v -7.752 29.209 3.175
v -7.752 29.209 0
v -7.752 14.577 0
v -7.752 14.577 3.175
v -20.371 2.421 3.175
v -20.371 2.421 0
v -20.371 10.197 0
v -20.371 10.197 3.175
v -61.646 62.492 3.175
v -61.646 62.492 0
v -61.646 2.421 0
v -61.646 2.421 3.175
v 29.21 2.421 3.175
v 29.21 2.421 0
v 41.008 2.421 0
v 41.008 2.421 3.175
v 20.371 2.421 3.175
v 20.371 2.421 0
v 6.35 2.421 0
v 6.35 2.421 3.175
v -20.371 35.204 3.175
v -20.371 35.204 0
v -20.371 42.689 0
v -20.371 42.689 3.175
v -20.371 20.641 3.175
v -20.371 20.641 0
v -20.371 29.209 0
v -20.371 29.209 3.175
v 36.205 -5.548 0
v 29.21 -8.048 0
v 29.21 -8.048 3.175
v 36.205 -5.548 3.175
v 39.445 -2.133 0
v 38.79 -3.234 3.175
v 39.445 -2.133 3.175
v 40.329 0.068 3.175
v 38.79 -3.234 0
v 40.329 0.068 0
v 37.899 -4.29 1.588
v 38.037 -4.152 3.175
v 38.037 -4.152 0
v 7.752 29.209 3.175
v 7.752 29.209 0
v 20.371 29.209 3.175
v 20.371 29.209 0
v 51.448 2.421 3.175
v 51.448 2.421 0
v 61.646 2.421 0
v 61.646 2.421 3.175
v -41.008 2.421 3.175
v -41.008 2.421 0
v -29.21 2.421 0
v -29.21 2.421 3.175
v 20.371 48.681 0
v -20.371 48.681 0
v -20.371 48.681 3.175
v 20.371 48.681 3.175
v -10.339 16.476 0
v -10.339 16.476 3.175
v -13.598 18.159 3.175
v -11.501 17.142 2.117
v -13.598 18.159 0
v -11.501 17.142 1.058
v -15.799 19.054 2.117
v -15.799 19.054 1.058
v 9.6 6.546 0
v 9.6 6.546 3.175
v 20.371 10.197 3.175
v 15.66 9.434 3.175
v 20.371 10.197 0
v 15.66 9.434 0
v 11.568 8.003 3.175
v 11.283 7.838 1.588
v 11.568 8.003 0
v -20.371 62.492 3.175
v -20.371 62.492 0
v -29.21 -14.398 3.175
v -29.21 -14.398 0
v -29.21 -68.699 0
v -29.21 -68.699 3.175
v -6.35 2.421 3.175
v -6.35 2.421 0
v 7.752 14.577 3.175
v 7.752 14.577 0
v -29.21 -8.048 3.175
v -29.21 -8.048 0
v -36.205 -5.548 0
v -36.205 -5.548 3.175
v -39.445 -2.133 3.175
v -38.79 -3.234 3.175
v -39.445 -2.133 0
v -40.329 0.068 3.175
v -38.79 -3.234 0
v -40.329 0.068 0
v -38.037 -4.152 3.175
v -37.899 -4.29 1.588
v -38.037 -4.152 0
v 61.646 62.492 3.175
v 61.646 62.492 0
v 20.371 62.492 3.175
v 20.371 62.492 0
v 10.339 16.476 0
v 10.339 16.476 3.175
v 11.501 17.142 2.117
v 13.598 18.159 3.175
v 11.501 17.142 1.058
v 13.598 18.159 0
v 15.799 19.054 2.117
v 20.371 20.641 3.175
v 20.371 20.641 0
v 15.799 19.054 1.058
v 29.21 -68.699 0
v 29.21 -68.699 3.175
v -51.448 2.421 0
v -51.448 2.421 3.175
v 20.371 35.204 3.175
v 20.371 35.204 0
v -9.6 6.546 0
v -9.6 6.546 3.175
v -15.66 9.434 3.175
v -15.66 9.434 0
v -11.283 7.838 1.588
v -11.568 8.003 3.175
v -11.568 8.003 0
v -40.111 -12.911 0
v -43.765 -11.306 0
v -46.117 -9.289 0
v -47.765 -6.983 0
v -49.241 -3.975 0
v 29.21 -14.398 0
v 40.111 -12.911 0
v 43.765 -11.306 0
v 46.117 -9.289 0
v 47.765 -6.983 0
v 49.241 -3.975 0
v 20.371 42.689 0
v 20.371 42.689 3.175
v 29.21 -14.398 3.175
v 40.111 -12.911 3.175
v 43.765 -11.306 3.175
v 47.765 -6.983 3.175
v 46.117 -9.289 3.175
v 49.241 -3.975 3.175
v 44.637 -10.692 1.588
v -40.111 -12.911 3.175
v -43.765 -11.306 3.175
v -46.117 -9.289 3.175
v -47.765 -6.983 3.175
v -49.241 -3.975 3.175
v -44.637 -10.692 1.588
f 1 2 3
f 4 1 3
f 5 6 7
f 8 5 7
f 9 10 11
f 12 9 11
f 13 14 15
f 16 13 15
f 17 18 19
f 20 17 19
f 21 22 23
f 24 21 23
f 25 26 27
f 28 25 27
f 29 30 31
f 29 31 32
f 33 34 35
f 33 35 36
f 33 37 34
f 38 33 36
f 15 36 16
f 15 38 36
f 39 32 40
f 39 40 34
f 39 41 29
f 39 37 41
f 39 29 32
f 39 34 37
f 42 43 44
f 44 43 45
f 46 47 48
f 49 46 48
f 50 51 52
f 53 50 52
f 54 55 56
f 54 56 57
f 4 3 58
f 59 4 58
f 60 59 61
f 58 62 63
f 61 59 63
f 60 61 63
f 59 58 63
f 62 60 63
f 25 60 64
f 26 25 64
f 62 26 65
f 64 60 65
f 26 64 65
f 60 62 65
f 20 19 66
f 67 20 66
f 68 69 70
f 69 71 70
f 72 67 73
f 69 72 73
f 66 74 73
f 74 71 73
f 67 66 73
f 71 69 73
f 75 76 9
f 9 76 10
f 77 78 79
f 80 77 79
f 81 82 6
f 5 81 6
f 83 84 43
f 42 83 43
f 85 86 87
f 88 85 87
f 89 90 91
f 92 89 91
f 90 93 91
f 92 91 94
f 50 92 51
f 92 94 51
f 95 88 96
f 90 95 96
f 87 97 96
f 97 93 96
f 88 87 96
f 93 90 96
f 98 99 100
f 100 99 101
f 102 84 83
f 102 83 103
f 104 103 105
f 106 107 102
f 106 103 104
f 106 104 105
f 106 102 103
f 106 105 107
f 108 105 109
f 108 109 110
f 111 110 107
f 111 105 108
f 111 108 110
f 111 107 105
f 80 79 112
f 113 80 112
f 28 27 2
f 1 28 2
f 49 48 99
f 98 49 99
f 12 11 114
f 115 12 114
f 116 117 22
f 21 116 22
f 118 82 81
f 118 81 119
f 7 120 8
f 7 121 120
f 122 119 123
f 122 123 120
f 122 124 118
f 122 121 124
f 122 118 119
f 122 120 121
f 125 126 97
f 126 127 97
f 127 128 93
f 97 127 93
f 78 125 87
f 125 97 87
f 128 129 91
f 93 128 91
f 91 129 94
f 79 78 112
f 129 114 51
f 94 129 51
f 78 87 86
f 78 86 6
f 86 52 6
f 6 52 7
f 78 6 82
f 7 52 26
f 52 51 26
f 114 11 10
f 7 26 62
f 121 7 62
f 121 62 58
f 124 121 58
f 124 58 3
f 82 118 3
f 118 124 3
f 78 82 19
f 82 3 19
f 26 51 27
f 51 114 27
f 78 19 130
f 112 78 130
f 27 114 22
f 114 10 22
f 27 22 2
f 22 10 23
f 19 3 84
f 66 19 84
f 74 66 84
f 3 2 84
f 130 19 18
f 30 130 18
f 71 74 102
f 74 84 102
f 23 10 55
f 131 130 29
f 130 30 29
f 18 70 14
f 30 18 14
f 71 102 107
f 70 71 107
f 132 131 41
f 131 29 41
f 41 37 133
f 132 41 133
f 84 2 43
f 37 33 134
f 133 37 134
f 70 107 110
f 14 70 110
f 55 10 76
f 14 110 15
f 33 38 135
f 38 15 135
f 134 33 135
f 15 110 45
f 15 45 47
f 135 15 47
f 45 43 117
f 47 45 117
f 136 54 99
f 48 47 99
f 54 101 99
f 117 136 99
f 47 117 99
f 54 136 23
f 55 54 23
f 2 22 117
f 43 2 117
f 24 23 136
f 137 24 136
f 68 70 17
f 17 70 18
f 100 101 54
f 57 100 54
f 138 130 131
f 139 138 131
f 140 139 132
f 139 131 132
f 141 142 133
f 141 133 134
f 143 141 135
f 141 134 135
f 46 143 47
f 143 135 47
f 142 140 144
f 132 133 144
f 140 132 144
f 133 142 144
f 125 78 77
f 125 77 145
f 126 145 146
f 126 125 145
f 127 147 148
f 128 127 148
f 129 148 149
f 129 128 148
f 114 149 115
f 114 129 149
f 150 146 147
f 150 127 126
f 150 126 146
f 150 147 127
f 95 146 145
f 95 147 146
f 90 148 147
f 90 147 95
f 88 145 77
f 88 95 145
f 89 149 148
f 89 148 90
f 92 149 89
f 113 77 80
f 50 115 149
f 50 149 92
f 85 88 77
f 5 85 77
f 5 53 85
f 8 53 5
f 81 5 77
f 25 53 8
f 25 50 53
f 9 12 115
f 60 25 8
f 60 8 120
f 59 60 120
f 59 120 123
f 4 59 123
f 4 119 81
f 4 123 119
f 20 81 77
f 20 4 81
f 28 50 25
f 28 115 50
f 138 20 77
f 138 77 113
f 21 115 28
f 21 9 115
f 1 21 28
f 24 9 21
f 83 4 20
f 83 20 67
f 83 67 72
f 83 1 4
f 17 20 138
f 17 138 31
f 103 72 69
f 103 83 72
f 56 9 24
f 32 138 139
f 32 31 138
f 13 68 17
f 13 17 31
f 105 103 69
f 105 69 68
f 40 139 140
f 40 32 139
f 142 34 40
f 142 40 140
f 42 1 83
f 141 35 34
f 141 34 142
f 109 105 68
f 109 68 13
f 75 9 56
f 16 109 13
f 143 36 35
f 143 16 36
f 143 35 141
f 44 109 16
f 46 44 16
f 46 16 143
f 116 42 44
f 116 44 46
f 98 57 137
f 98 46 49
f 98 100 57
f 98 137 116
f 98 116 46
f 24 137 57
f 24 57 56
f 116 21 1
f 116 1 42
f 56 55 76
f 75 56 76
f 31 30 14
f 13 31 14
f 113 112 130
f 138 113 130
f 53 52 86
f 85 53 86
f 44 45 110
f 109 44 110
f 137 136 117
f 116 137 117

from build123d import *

# Parameters (mm, degrees)
F0_W     = 40.7416
F0_H     = 5.9913918376
F1_DEPTH = 3.175


# Not quite as in the source:
# - a feature names something its author has since deleted; it is built from what else it names


with BuildPart() as f1:
    # F0 (on Top) → F1 (new body)
    with BuildSketch(Plane.XY):
        Polygon((6.35, 2.420714612), (0, 2.420714612), (-6.35, 2.420714612), (-20.3708, 2.420714612), (-22.9107162118, 2.420714612), (-29.21, 2.420714612), (-29.21, -8.0478828564), (-29.21, -14.3978828564), (-29.21, -68.699285388), (29.21, -68.699285388), (29.21, -14.3978828564), (29.21, -8.0478828564), (29.21, 2.420714612), (20.3708, 2.420714612), align=None)
        Polygon((20.3708, 10.1967882365), (20.3708, 2.420714612), (29.21, 2.420714612), (41.0083, 2.420714612), (51.4477, 2.420714612), (61.6458, 2.420714612), (61.6458, 62.491714612), (20.3708, 62.491714612), (20.3708, 48.6805066466), (20.3708, 42.689114809), (20.3708, 35.2035965675), (20.3708, 29.2091965675), (20.3708, 20.6410996616), align=None)
        Polygon((-22.9107162118, 2.420714612), (-20.3708, 2.420714612), (-20.3708, 10.1967882365), (-20.3708, 20.6410996616), (-20.3708, 29.2091965675), (-20.3708, 35.2035965675), (-20.3708, 42.689114809), (-20.3708, 48.6805066466), (-20.3708, 62.491714612), (-61.6458, 62.491714612), (-61.6458, 2.420714612), (-51.4477, 2.420714612), (-41.0083, 2.420714612), (-29.21, 2.420714612), align=None)
        with BuildLine():
            add(Edge.make_bspline(
                [(29.21, -8.0478828564), (32.5638420451, -7.1347003919), (38.8822247108, -5.4143342635), (40.3293289084, -0.0814412218), (41.0083, 2.420714612)],
                knots=[0, 0, 0, 0, 0.5308070471, 1, 1, 1, 1], degree=3))
            Line((29.21, -8.0478828564), (29.21, -14.3978828564))
            add(Edge.make_bspline(
                [(29.21, -14.3978828564), (35.0623442189, -14.0006727781), (46.562333527, -13.2201459527), (49.8386841247, -2.7306682151), (51.4477, 2.420714612)],
                knots=[0, 0, 0, 0, 0.5088999704, 1, 1, 1, 1], degree=3))
            Line((51.4477, 2.420714612), (41.0083, 2.420714612))
        make_face()
        with BuildLine():
            Line((-29.21, -14.3978828564), (-29.21, -8.0478828564))
            add(Edge.make_bspline(
                [(-29.21, -8.0478828564), (-32.5638420451, -7.1347003919), (-38.8822247108, -5.4143342635), (-40.3293289084, -0.0814412218), (-41.0083, 2.420714612)],
                knots=[0, 0, 0, 0, 0.5308070471, 1, 1, 1, 1], degree=3))
            Line((-41.0083, 2.420714612), (-51.4477, 2.420714612))
            add(Edge.make_bspline(
                [(-29.21, -14.3978828564), (-35.0623442189, -14.0006727781), (-46.562333527, -13.2201459527), (-49.8386841247, -2.7306682151), (-51.4477, 2.420714612)],
                knots=[0, 0, 0, 0, 0.5088999704, 1, 1, 1, 1], degree=3))
        make_face()
        with Locations((0, 45.6848107278)):
            Rectangle(F0_W, F0_H)
        with BuildLine():
            Line((-6.35, 2.420714612), (0, 2.420714612))
            add(Edge.make_bspline(
                [(0, 2.420714612), (-2.1599363926, 6.9765171348), (-4.3198727852, 11.5323196577), (-7.7523121432, 14.5766604692)],
                knots=[0, 0, 0, 0, 0.5036722623, 0.5036722623, 0.5036722623, 0.5036722623], degree=3))
            add(Edge.make_bspline(
                [(-7.7523121432, 14.5766604692), (-11.1346998365, 17.5766088502), (-15.7527499182, 19.1088542559), (-20.3708, 20.6410996616)],
                knots=[0.5036722623, 0.5036722623, 0.5036722623, 0.5036722623, 1, 1, 1, 1], degree=3))
            Line((-20.3708, 20.6410996616), (-20.3708, 10.1967882365))
            add(Edge.make_bspline(
                [(-6.35, 2.420714612), (-7.7523121432, 4.4872624945), (-10.7420432518, 8.8931449662), (-17.0314139567, 9.7446667159), (-20.3708, 10.1967882365)],
                knots=[0, 0, 0, 0, 0.4690428979, 1, 1, 1, 1], degree=3))
        make_face()
        with BuildLine():
            add(Edge.make_bspline(
                [(0, 2.420714612), (2.1599363926, 6.9765171348), (4.3198727852, 11.5323196577), (7.7523121432, 14.5766604692)],
                knots=[0, 0, 0, 0, 0.5036722623, 0.5036722623, 0.5036722623, 0.5036722623], degree=3))
            Line((0, 2.420714612), (6.35, 2.420714612))
            add(Edge.make_bspline(
                [(6.35, 2.420714612), (7.7523121432, 4.4872624945), (10.7420432518, 8.8931449662), (17.0314139567, 9.7446667159), (20.3708, 10.1967882365)],
                knots=[0, 0, 0, 0, 0.4690428979, 1, 1, 1, 1], degree=3))
            Line((20.3708, 10.1967882365), (20.3708, 20.6410996616))
            add(Edge.make_bspline(
                [(7.7523121432, 14.5766604692), (11.1346998365, 17.5766088502), (15.7527499182, 19.1088542559), (20.3708, 20.6410996616)],
                knots=[0.5036722623, 0.5036722623, 0.5036722623, 0.5036722623, 1, 1, 1, 1], degree=3))
        make_face()
        with BuildLine():
            add(Edge.make_bspline(
                [(0, 2.420714612), (-2.1599363926, 6.9765171348), (-4.3198727852, 11.5323196577), (-7.7523121432, 14.5766604692)],
                knots=[0, 0, 0, 0, 0.5036722623, 0.5036722623, 0.5036722623, 0.5036722623], degree=3))
            add(Edge.make_bspline(
                [(0, 2.420714612), (2.1599363926, 6.9765171348), (4.3198727852, 11.5323196577), (7.7523121432, 14.5766604692)],
                knots=[0, 0, 0, 0, 0.5036722623, 0.5036722623, 0.5036722623, 0.5036722623], degree=3))
            Line((7.7523121432, 14.5766604692), (7.7523121432, 29.2091965675))
            Line((7.7523121432, 29.2091965675), (-7.7523121432, 29.2091965675))
            Line((-7.7523121432, 29.2091965675), (-7.7523121432, 14.5766604692))
        make_face()
        Polygon((-7.7523121432, 29.2091965675), (7.7523121432, 29.2091965675), (20.3708, 29.2091965675), (20.3708, 35.2035965675), (-20.3708, 35.2035965675), (-20.3708, 29.2091965675), align=None)
    extrude(amount=F1_DEPTH)


solid = f1.part
